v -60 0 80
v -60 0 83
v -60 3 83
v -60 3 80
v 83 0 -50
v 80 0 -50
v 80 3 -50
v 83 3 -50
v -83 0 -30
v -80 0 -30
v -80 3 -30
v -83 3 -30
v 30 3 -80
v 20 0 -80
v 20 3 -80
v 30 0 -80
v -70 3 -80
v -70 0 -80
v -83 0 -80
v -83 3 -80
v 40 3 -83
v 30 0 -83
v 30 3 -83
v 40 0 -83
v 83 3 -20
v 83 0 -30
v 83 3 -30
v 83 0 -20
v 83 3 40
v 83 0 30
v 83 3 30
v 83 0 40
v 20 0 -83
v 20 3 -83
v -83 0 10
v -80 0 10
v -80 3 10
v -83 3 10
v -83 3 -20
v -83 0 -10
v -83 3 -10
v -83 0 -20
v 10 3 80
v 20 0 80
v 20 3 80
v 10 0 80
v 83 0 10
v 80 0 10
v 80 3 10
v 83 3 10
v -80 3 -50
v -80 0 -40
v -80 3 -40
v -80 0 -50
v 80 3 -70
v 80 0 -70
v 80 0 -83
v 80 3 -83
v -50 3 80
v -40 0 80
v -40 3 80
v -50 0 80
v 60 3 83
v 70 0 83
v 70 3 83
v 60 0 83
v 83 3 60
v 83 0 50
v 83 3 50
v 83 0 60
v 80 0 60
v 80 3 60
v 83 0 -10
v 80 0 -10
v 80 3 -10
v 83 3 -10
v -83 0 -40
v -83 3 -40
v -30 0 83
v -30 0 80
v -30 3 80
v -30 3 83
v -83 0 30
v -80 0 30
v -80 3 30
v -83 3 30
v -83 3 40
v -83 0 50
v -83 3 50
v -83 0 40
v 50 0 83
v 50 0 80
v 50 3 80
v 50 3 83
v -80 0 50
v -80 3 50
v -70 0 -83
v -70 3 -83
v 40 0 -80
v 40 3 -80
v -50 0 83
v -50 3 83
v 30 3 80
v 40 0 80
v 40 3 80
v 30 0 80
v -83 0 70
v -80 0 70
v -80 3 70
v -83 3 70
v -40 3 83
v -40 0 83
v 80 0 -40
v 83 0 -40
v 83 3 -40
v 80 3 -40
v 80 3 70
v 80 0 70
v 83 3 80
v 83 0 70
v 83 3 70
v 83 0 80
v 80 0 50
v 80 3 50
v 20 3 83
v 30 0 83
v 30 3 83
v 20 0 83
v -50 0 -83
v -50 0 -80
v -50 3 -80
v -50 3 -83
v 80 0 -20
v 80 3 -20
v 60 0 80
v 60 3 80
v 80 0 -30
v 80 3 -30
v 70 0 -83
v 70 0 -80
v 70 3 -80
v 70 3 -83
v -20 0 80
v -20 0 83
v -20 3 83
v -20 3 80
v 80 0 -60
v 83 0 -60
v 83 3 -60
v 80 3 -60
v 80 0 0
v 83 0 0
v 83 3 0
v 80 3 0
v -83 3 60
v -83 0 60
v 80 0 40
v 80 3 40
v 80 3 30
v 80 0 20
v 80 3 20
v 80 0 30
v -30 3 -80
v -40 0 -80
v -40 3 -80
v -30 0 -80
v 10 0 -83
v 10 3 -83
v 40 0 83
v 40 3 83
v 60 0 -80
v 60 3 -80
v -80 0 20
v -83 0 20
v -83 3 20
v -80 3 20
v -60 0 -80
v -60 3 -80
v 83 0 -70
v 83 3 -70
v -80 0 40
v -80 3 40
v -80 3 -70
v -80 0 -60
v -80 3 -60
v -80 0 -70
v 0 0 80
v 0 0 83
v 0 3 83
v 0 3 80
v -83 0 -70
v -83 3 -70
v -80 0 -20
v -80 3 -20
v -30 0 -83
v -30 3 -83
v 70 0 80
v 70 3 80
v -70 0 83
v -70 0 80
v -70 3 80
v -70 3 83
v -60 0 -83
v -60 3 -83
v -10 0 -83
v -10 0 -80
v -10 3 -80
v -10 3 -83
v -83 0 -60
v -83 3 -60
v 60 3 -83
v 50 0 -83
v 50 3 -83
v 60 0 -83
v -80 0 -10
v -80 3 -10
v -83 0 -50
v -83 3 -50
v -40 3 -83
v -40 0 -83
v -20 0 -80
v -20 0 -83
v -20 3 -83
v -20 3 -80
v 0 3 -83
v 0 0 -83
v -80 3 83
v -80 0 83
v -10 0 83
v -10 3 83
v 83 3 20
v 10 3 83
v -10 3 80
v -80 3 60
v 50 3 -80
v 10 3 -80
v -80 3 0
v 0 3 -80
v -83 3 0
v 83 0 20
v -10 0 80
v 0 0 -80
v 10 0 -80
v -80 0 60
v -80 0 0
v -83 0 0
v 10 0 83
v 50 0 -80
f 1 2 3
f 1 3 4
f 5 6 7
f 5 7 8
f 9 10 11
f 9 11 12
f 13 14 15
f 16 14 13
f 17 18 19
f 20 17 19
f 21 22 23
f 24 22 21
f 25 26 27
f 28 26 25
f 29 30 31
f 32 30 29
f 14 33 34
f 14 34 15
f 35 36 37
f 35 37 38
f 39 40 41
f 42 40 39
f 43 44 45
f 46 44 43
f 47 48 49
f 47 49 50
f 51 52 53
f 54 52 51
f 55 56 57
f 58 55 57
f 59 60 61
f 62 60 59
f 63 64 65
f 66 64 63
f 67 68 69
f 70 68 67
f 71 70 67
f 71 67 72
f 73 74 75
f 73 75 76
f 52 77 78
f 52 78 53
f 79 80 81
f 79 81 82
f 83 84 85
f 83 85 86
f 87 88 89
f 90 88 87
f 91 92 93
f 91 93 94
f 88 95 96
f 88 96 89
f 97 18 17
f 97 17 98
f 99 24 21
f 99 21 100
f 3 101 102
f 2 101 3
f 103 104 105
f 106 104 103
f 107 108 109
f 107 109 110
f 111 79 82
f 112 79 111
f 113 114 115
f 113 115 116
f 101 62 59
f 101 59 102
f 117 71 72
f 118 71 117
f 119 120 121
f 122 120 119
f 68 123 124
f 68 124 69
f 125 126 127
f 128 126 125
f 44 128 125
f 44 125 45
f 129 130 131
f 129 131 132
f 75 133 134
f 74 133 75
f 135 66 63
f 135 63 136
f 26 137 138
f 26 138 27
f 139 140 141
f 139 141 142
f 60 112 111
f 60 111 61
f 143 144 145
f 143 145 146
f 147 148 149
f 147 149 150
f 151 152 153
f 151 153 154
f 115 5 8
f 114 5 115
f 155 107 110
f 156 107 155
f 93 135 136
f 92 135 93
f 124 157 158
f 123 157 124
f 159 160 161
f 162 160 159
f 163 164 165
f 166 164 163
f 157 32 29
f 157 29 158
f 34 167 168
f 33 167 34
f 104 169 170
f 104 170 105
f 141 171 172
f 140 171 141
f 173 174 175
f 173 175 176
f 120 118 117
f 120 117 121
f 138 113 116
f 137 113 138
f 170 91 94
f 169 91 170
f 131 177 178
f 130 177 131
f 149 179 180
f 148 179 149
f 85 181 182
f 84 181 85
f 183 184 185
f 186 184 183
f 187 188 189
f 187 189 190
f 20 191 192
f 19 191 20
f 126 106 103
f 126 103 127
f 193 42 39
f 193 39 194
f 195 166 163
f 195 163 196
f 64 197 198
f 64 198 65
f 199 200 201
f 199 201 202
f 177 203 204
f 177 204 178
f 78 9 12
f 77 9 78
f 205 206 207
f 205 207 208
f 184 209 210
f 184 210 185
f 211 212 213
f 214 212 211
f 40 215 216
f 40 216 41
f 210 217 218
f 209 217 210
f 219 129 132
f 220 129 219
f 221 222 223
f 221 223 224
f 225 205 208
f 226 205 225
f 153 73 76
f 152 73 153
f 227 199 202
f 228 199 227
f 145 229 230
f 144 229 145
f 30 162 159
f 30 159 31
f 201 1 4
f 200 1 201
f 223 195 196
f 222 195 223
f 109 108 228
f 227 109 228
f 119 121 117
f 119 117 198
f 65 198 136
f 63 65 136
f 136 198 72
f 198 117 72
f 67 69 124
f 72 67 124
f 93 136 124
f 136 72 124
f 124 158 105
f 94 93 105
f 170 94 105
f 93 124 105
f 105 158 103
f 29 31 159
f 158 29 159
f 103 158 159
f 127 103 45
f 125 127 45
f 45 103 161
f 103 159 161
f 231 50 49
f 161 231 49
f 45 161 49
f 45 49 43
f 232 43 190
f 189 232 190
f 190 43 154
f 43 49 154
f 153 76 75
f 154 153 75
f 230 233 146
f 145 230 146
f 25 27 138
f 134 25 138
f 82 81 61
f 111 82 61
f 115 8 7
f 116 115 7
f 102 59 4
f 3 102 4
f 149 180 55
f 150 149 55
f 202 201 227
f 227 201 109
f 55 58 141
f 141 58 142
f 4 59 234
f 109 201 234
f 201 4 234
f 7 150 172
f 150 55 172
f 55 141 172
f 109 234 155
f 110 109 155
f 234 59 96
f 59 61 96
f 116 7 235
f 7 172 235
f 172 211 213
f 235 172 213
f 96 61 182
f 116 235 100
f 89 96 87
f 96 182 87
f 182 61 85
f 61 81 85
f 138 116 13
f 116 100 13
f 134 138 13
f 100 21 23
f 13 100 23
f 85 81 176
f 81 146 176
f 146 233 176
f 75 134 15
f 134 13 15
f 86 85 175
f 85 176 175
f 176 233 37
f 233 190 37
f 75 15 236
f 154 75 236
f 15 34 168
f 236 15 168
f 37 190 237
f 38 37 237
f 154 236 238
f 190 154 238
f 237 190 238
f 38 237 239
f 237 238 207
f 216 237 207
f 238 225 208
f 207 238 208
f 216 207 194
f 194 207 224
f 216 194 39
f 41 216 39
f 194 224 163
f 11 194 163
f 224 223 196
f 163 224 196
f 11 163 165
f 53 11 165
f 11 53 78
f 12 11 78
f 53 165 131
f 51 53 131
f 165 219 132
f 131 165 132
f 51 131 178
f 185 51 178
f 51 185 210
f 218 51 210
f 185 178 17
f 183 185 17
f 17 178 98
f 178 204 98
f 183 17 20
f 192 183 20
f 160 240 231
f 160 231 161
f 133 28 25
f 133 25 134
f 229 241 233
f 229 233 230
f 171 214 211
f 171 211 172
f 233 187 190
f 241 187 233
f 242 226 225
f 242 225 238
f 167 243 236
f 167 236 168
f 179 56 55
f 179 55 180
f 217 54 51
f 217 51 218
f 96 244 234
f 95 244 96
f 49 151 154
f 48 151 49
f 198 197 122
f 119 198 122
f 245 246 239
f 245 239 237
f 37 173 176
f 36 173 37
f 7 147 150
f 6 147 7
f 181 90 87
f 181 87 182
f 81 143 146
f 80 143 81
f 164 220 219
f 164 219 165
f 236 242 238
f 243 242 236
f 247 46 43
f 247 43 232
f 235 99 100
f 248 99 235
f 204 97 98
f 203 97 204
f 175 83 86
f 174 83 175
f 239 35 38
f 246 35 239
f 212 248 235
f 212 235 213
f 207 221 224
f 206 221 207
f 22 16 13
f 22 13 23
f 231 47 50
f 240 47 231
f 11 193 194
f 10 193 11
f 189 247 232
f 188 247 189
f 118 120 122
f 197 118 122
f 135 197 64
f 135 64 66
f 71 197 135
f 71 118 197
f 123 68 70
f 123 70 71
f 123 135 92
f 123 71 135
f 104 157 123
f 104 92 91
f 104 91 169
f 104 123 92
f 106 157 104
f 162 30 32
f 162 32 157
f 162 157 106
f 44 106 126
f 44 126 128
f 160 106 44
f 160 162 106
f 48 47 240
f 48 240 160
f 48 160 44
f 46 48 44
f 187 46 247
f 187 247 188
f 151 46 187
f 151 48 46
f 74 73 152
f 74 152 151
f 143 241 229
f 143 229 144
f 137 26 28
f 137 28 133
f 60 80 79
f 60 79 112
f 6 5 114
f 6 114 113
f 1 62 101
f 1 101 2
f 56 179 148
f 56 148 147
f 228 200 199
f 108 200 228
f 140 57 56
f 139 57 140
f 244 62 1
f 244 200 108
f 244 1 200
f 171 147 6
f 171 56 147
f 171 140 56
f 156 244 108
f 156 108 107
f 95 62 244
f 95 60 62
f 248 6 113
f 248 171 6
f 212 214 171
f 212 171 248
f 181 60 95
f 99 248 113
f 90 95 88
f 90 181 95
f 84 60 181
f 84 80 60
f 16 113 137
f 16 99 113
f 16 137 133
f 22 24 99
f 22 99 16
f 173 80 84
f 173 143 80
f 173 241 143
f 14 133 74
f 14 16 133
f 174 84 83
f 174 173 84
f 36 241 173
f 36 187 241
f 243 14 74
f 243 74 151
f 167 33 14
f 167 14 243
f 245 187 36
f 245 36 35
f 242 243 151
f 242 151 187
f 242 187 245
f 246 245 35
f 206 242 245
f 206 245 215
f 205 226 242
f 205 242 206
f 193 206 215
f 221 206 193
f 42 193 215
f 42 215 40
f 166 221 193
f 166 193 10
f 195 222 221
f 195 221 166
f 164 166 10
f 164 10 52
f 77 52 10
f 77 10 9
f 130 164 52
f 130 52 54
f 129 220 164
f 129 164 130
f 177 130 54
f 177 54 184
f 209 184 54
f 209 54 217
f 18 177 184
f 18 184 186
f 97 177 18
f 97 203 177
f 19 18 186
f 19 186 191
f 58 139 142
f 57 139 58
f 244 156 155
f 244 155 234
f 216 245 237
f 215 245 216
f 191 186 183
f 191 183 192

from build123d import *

# Parameters (mm, degrees)
BOSS_EXTRUDE1_DEPTH = 3


with BuildPart() as part:
    # Sketch1 → Boss-Extrude1 (new body)
    with BuildSketch(Plane(origin=(0, 0, 0), x_dir=(1, 0, 0), z_dir=(0, 1, 0))):
        Polygon((80, 80), (80, 70), (83, 70), (83, 60), (80, 60), (80, 50), (83, 50), (83, 40), (80, 40), (80, 30), (83, 30), (83, 20), (80, 20), (80, 10), (83, 10), (83, 0), (80, 0), (80, -10), (83, -10), (83, -20), (80, -20), (80, -30), (83, -30), (83, -40), (80, -40), (80, -50), (83, -50), (83, -60), (80, -60), (80, -70), (83, -70), (83, -80), (80, -80), (70, -80), (70, -83), (60, -83), (60, -80), (50, -80), (50, -83), (40, -83), (40, -80), (30, -80), (30, -83), (20, -83), (20, -80), (10, -80), (10, -83), (0, -83), (0, -80), (-10, -80), (-10, -83), (-20, -83), (-20, -80), (-30, -80), (-30, -83), (-40, -83), (-40, -80), (-50, -80), (-50, -83), (-60, -83), (-60, -80), (-70, -80), (-70, -83), (-80, -83), (-80, -80), (-80, -70), (-83, -70), (-83, -60), (-80, -60), (-80, -50), (-83, -50), (-83, -40), (-80, -40), (-80, -30), (-83, -30), (-83, -20), (-80, -20), (-80, -10), (-83, -10), (-83, 0), (-80, 0), (-80, 10), (-83, 10), (-83, 20), (-80, 20), (-80, 30), (-83, 30), (-83, 40), (-80, 40), (-80, 50), (-83, 50), (-83, 60), (-80, 60), (-80, 70), (-83, 70), (-83, 80), (-80, 80), (-70, 80), (-70, 83), (-60, 83), (-60, 80), (-50, 80), (-50, 83), (-40, 83), (-40, 80), (-30, 80), (-30, 83), (-20, 83), (-20, 80), (-10, 80), (-10, 83), (0, 83), (0, 80), (10, 80), (10, 83), (20, 83), (20, 80), (30, 80), (30, 83), (40, 83), (40, 80), (50, 80), (50, 83), (60, 83), (60, 80), (70, 80), (70, 83), (80, 83), align=None)
    extrude(amount=BOSS_EXTRUDE1_DEPTH)


solid = part.part
